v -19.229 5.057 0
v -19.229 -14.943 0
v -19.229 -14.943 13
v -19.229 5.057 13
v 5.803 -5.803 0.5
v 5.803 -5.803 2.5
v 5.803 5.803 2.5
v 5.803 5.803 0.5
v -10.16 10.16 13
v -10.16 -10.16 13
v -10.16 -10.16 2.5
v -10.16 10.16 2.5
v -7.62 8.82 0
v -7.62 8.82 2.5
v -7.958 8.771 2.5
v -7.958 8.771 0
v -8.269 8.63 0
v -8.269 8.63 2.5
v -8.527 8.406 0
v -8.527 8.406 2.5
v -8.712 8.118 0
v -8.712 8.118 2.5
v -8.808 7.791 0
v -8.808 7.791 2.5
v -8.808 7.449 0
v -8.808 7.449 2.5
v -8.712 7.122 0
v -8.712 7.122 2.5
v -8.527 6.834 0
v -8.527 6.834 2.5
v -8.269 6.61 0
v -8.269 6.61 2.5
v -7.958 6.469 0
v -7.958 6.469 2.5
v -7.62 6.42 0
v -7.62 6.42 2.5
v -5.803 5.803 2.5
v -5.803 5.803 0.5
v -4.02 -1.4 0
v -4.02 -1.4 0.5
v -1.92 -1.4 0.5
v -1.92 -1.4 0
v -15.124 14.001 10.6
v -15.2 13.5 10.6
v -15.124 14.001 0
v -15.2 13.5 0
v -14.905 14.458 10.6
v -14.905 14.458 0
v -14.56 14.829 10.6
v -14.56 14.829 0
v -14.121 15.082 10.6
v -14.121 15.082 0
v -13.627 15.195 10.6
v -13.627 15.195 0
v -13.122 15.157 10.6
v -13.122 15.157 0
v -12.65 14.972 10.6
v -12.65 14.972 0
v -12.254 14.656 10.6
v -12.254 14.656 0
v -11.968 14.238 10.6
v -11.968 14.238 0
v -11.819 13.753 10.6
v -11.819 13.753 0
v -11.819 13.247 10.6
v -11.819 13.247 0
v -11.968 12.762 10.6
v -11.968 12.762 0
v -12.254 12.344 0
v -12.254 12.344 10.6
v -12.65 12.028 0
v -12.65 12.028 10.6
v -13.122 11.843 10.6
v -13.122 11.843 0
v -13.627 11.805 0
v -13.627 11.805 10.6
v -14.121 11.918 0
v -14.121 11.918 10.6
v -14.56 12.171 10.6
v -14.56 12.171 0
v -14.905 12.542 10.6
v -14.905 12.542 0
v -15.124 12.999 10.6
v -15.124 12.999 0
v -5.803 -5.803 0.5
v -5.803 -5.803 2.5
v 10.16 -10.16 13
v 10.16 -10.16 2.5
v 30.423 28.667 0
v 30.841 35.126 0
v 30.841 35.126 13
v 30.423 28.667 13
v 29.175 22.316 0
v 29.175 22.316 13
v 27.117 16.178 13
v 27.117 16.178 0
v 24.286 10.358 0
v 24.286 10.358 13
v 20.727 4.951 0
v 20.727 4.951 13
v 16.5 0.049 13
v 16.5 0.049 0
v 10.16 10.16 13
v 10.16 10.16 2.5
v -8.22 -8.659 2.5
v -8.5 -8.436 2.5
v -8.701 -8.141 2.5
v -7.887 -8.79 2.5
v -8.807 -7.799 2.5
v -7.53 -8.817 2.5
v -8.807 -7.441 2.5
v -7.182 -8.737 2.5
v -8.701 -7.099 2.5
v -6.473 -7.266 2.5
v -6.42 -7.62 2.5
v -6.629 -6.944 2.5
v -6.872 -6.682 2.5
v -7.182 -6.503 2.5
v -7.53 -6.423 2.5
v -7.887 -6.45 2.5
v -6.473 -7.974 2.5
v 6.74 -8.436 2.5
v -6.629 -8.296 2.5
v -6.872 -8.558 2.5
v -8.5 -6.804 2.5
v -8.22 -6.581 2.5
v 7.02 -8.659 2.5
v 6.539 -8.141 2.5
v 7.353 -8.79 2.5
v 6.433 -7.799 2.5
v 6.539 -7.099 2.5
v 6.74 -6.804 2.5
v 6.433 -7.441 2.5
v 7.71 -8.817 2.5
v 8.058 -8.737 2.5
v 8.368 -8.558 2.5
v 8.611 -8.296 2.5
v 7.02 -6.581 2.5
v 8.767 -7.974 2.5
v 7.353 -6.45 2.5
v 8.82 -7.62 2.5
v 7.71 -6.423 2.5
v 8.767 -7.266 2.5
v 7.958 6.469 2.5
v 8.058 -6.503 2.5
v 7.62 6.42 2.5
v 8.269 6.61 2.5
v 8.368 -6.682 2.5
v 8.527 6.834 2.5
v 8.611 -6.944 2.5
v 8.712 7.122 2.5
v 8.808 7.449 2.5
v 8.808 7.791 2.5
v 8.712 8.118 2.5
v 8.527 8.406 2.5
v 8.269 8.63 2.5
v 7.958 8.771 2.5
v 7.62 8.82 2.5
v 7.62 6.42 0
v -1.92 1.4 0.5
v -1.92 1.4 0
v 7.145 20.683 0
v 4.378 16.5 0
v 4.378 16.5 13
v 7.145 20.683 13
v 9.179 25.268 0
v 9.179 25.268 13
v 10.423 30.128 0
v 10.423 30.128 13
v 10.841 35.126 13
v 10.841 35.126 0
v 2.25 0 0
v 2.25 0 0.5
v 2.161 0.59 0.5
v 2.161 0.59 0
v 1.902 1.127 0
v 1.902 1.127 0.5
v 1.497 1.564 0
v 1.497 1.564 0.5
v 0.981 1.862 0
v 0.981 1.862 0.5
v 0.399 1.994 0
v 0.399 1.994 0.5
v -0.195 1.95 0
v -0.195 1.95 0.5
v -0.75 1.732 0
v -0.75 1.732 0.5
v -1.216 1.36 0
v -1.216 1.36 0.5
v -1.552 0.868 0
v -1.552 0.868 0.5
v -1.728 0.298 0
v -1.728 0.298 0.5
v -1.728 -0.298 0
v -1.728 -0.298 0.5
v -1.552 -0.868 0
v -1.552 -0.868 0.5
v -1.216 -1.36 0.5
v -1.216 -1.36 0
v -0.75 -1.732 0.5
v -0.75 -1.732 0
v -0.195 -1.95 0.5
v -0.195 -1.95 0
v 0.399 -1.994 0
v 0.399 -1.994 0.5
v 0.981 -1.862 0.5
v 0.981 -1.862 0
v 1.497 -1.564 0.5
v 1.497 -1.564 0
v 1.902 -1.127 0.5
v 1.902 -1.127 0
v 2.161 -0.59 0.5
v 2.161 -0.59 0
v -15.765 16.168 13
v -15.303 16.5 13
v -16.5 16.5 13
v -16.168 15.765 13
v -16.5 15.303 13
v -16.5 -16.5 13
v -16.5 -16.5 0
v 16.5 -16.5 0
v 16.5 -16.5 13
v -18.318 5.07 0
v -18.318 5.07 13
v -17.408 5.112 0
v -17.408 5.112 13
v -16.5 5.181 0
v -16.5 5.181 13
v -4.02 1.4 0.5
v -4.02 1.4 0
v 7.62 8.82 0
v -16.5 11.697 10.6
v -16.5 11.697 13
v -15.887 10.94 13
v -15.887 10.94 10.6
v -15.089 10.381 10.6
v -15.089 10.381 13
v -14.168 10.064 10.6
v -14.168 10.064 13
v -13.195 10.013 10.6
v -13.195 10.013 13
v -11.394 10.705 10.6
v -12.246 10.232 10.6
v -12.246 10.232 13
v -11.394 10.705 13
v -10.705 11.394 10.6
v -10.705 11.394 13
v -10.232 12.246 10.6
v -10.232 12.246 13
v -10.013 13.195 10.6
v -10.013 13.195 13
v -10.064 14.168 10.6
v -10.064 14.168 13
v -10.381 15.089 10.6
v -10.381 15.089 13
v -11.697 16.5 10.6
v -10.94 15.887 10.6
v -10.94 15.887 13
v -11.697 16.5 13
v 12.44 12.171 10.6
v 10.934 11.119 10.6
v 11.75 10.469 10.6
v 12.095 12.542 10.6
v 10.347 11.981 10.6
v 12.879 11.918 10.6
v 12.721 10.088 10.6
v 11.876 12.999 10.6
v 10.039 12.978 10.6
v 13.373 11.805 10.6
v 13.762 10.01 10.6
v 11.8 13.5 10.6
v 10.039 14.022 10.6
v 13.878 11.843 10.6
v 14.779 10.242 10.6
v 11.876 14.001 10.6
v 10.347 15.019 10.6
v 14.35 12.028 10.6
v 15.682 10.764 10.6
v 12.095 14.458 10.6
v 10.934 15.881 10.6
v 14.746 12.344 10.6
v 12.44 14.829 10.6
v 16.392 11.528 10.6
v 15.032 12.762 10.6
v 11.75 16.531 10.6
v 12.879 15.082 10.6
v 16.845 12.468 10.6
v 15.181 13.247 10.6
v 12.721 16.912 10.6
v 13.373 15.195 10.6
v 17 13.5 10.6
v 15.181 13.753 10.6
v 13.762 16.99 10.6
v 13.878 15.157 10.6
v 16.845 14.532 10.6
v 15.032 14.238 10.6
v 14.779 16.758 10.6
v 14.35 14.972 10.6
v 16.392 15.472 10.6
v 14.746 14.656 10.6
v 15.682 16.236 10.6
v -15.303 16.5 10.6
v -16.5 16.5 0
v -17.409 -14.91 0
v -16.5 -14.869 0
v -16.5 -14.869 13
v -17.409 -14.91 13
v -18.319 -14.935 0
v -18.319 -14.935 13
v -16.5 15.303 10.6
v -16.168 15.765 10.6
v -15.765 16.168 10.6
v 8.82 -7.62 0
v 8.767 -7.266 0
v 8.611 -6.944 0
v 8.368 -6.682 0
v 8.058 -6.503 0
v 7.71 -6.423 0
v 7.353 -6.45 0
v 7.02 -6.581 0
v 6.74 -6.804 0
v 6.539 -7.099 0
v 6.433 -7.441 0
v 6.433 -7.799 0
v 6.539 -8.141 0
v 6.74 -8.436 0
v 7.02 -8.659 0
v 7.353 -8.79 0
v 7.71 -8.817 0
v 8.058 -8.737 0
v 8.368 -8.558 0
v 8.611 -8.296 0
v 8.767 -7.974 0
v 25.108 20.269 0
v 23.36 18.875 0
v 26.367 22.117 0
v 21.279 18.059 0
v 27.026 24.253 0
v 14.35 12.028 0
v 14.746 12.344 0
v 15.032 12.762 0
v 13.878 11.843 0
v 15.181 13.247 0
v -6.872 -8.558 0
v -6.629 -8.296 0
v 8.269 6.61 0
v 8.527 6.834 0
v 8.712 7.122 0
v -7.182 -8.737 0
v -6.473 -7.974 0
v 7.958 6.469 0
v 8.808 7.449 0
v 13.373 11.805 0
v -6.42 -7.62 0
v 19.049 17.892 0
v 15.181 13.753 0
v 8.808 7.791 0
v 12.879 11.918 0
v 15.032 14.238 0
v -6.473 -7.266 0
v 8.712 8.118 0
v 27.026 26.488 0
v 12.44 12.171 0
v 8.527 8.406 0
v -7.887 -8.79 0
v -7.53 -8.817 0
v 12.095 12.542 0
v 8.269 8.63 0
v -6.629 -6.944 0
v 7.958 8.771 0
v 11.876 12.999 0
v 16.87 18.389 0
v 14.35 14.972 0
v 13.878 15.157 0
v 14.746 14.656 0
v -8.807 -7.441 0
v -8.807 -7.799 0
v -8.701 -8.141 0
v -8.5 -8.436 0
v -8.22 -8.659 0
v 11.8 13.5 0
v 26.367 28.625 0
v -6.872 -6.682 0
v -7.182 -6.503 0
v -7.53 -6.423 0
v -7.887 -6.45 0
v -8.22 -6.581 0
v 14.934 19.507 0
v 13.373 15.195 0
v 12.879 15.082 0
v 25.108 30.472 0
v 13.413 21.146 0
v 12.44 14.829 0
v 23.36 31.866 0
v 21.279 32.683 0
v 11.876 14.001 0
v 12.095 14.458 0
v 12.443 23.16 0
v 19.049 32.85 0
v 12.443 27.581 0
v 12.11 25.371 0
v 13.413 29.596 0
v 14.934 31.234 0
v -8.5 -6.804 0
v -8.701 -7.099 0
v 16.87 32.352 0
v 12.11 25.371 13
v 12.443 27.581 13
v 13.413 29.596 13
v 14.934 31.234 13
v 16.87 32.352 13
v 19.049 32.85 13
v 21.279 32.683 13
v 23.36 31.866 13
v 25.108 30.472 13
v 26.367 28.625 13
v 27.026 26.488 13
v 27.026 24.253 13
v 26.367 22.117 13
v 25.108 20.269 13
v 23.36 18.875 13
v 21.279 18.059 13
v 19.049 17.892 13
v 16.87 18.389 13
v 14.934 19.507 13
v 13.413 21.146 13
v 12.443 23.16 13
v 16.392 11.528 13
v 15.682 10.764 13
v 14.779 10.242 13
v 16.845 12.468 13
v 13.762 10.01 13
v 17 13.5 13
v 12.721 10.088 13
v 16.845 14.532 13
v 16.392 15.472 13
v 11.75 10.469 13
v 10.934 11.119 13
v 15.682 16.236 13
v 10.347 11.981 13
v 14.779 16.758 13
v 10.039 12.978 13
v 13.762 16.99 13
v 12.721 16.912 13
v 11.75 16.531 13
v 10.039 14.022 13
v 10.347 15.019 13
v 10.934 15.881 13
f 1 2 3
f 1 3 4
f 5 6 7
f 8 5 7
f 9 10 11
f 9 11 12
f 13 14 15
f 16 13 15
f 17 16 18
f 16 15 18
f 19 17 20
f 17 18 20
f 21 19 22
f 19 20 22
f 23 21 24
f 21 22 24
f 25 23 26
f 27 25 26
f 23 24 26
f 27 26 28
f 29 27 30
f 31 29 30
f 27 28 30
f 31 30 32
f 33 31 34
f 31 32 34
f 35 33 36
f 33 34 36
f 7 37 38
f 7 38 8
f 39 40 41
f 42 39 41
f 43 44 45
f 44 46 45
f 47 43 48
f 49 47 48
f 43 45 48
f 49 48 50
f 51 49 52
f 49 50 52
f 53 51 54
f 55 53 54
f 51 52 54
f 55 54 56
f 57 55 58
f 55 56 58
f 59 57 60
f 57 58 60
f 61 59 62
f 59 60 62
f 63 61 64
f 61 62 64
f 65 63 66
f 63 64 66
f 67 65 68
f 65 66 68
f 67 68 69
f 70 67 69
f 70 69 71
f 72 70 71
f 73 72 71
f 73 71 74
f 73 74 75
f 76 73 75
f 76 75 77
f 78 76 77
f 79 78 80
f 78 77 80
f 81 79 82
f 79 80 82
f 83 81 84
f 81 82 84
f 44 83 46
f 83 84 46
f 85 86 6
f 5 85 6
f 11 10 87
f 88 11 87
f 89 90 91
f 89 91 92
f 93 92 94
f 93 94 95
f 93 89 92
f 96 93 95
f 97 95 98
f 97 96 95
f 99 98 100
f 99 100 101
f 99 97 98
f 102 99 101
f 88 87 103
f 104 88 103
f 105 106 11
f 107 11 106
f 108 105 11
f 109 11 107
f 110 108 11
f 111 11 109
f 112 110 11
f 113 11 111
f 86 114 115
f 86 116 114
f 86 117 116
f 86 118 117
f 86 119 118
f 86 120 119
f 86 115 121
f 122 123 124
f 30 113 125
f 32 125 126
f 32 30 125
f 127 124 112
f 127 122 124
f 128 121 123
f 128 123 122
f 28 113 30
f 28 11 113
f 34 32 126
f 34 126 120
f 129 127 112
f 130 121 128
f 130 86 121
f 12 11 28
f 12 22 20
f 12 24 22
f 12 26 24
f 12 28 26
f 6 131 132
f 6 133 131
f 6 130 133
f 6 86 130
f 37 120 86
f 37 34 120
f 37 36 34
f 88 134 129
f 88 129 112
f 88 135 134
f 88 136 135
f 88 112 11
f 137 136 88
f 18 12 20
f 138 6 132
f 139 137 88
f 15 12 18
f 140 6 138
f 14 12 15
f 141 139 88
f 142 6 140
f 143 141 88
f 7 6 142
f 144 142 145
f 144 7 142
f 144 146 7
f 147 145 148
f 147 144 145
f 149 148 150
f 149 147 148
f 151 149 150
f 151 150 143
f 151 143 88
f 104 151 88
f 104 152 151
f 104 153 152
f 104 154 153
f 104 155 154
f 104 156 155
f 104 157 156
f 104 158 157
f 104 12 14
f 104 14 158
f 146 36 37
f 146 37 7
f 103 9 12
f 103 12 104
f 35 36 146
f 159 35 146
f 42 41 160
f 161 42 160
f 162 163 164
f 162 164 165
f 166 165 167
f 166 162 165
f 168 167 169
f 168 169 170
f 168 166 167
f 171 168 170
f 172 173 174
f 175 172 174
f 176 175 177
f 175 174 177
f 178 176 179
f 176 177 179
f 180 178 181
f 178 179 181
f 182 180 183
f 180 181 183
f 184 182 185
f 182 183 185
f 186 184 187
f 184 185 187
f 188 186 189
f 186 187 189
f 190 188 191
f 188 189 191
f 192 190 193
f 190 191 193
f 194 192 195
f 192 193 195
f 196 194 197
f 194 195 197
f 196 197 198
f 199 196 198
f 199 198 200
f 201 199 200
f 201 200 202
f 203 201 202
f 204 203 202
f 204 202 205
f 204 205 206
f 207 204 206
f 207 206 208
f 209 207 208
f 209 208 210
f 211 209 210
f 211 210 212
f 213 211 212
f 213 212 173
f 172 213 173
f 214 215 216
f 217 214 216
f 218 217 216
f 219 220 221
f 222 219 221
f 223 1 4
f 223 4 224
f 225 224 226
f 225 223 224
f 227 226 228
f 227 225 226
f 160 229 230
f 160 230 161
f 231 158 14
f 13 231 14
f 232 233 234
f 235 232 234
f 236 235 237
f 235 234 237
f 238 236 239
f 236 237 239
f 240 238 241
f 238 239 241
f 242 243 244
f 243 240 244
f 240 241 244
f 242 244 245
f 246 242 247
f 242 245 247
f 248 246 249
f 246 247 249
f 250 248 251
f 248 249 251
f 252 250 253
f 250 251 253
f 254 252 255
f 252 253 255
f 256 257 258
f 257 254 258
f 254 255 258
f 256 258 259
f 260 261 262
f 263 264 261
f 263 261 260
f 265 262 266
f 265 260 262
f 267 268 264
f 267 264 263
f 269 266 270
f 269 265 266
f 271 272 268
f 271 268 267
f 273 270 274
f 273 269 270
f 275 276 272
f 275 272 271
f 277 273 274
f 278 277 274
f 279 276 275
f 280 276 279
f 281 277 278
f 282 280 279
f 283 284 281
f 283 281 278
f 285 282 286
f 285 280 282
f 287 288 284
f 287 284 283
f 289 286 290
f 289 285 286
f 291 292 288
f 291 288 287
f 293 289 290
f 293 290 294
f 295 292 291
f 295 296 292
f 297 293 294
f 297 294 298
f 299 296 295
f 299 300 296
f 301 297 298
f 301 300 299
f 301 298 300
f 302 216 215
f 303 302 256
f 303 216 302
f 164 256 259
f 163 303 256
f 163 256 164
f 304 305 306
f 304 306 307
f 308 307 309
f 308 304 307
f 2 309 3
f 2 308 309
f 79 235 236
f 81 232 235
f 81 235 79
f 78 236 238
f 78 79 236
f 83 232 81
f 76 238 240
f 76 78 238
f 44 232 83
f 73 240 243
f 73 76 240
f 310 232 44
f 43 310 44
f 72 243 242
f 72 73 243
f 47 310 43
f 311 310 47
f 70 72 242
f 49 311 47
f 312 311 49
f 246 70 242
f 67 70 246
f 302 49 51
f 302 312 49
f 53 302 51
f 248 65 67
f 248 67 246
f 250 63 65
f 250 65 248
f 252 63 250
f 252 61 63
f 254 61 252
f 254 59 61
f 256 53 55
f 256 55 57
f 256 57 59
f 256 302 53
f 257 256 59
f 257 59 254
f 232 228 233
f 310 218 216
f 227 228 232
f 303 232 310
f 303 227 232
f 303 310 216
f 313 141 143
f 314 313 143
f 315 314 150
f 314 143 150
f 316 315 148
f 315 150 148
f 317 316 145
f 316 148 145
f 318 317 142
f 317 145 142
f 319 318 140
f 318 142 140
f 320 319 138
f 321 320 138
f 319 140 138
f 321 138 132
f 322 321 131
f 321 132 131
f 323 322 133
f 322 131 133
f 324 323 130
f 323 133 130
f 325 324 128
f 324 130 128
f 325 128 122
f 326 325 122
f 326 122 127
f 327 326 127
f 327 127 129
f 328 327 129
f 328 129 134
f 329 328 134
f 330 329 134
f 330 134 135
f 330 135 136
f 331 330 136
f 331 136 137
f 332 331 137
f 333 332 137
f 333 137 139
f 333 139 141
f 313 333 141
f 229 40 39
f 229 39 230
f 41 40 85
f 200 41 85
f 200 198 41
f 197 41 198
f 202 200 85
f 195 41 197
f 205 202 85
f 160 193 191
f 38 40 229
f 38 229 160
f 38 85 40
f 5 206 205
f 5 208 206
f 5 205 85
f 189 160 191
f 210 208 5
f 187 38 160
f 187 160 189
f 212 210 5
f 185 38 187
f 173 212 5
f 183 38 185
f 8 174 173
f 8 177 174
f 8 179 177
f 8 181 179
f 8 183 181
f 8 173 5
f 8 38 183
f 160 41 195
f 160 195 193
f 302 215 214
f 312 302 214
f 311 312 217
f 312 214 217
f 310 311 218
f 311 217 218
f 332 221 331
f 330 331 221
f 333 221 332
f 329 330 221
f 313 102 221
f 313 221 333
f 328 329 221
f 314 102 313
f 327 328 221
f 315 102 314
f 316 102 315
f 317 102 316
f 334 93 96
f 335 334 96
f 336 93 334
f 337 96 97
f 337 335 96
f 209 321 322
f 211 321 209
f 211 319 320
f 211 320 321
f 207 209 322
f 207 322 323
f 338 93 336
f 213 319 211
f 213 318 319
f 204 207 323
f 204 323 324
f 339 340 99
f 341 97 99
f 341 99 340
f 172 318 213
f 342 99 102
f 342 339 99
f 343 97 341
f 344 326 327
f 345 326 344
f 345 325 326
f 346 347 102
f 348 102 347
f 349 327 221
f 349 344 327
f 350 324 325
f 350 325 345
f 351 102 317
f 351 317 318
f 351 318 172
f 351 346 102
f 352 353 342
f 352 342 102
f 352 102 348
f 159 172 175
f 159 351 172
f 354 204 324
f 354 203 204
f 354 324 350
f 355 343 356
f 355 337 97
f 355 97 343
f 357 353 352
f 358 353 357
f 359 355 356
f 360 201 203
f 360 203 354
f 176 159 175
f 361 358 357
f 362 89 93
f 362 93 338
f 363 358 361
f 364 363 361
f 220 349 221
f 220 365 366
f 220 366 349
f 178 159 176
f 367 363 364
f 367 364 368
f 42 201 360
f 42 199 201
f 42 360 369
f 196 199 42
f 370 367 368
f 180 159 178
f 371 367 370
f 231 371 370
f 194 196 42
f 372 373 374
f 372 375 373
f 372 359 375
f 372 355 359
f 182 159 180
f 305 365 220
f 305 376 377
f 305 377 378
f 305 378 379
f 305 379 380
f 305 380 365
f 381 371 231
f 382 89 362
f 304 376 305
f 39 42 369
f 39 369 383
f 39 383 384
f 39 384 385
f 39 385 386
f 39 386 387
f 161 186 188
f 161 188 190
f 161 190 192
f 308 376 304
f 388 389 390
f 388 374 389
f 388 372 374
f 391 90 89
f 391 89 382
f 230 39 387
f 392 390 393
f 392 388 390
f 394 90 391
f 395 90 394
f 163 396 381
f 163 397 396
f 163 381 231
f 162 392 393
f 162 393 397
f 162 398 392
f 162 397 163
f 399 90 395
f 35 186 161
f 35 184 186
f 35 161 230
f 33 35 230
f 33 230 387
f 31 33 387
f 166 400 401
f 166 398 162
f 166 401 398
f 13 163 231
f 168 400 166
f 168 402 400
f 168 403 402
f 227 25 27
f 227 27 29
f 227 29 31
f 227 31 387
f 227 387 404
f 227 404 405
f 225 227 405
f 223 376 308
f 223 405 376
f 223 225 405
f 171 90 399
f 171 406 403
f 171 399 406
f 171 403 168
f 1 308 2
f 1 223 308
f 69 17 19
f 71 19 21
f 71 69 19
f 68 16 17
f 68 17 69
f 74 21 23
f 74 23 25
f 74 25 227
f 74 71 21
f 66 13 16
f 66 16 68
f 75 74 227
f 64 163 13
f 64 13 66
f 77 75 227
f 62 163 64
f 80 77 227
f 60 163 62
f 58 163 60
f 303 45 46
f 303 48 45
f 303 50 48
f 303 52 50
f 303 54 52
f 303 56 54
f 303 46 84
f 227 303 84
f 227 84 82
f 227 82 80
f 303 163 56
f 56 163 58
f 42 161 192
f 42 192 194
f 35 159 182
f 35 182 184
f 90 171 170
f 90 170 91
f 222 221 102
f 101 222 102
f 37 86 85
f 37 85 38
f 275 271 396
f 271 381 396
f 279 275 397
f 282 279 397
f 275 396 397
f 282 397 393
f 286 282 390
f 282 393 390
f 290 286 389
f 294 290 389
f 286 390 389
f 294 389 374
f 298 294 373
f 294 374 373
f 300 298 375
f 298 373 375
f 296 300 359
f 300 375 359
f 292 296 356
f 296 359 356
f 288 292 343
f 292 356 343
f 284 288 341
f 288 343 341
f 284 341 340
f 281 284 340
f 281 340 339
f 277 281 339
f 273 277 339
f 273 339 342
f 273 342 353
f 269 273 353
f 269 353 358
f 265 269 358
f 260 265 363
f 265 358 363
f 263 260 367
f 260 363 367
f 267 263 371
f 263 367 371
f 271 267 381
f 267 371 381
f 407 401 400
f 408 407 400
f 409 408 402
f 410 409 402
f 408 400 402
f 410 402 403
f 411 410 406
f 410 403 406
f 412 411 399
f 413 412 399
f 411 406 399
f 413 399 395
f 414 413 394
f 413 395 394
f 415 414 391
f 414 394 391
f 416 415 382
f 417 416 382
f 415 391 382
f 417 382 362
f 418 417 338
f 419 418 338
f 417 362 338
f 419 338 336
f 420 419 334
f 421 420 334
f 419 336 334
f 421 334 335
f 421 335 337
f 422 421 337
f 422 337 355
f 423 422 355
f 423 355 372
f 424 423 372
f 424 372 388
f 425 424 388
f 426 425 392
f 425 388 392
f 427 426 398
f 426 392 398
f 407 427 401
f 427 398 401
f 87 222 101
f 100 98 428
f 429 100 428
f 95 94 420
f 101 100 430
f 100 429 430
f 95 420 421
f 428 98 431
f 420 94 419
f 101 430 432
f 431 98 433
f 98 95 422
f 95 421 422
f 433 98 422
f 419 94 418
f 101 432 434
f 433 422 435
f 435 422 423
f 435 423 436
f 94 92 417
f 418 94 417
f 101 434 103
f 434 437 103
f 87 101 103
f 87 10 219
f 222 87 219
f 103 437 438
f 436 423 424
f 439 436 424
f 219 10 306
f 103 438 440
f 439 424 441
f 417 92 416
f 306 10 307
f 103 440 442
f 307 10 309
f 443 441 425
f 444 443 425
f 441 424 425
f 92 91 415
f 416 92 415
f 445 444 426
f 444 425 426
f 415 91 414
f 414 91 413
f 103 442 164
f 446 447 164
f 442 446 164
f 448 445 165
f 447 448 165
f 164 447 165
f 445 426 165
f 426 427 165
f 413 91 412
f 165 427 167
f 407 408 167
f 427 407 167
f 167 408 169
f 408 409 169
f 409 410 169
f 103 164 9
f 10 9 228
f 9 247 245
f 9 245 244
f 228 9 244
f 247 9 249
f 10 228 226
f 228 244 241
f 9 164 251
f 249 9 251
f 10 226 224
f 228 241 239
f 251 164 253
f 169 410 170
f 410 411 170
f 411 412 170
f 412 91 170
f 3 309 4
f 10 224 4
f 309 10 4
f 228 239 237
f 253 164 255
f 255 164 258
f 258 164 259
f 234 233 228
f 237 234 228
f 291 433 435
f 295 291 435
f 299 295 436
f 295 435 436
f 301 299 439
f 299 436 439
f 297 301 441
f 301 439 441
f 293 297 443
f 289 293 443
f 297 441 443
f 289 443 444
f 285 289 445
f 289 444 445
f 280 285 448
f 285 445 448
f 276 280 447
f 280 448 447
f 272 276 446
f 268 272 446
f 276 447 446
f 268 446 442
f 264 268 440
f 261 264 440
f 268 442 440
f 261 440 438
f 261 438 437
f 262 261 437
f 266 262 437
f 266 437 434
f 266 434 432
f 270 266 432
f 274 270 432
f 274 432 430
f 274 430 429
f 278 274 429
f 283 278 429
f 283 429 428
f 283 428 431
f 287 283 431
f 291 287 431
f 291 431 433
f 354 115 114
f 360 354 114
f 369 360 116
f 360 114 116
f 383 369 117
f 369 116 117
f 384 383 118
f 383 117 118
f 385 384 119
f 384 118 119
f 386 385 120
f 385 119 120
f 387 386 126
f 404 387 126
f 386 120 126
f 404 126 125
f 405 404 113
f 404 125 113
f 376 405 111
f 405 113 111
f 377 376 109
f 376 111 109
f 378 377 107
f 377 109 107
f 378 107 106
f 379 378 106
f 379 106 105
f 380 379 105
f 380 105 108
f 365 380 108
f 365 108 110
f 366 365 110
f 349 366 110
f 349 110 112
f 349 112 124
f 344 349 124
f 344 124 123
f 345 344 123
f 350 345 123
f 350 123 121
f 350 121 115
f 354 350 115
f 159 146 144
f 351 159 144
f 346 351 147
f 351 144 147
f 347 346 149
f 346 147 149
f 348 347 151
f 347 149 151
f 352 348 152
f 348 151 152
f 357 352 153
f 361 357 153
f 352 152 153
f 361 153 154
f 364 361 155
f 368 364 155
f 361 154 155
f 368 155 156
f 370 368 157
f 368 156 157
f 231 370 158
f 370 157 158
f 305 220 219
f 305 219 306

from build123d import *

# Parameters (mm, degrees)
ESQUISSE1_W                                        = 33
ESQUISSE1_H                                        = 33
BOSS_EXTRU_1_DEPTH                                 = 13
ESQUISSE3_R                                        = 2
ESQUISSE3_W                                        = 2.1
ESQUISSE3_H                                        = 2.8
ENL_V_MAT_EXTRU_1_DEPTH                            = 14
ESQUISSE4_W                                        = 11.606208868
ESQUISSE4_H                                        = 11.606208868
ESQUISSE4_R                                        = 2
ENL_V_MAT_EXTRU_2_DEPTH                            = 12.5
ESQUISSE2_R                                        = 1.2
ENL_V_MAT_EXTRU_3_DEPTH                            = 14
ESQUISSE5_W                                        = 20.32
ESQUISSE5_H                                        = 20.32
ENL_V_MAT_EXTRU_5_DEPTH                            = 10.5
ESQUISSE8_R                                        = 7.5
BOSS_EXTRU_4_DEPTH                                 = 13
CHAMBRAGE_POUR_VIS_T_TE_RONDE_BOMB_E_M_D           = 3.4
CHAMBRAGE_POUR_VIS_T_TE_RONDE_BOMB_E_M_CBORE_D     = 7
CHAMBRAGE_POUR_VIS_T_TE_RONDE_BOMB_E_M_CBORE_DEPTH = 2.4


with BuildPart() as part:
    # Esquisse1 → Boss.-Extru.1 (new body)
    with BuildSketch(Plane.XY):
        Rectangle(ESQUISSE1_W, ESQUISSE1_H)
    extrude(amount=BOSS_EXTRU_1_DEPTH)

    # Esquisse3 → Enlèv. mat.-Extru.1 (cut, through all)
    with BuildSketch(Plane.XY.offset(13)):
        with Locations((0.25, 0)):
            Circle(ESQUISSE3_R)
        with Locations((-2.97, 0)):
            Rectangle(ESQUISSE3_W, ESQUISSE3_H)
    extrude(amount=-ENL_V_MAT_EXTRU_1_DEPTH, mode=Mode.SUBTRACT)

    # Esquisse4 → Enlèv. mat.-Extru.2 (cut)
    with BuildSketch(Plane.XY.offset(13)):
        Rectangle(ESQUISSE4_W, ESQUISSE4_H)
        with Locations((0.25, 0)):
            Circle(ESQUISSE4_R, mode=Mode.SUBTRACT)
    extrude(amount=-ENL_V_MAT_EXTRU_2_DEPTH, mode=Mode.SUBTRACT)

    # Esquisse2 → Enlèv. mat.-Extru.3 (cut, through all)
    with BuildSketch(Plane.XY.offset(13)):
        with BuildLine():
            Line((7.62, 8.82), (-7.62, 8.82))
            ThreePointArc((-7.62, 8.82), (-8.82, 7.62), (-7.62, 6.42))
            Line((-7.62, 6.42), (7.62, 6.42))
            ThreePointArc((7.62, 6.42), (8.82, 7.62), (7.62, 8.82))
        make_face()
        with Locations((7.62, -7.62)):
            Circle(ESQUISSE2_R)
        with Locations((-7.62, -7.62)):
            Circle(ESQUISSE2_R)
    extrude(amount=-ENL_V_MAT_EXTRU_3_DEPTH, mode=Mode.SUBTRACT)

    # Esquisse5 → Enlèv. mat.-Extru.5 (cut)
    with BuildSketch(Plane.XY.offset(13)):
        Rectangle(ESQUISSE5_W, ESQUISSE5_H)
    extrude(amount=-ENL_V_MAT_EXTRU_5_DEPTH, mode=Mode.SUBTRACT)

    # Esquisse8 → Boss.-Extru.4 (add)
    with BuildSketch(Plane(origin=(0, 0, 0), x_dir=(-1, 0, 0), z_dir=(0, 0, -1))):
        with BuildLine():
            Line((19.228652316, -14.943489853), (19.228652316, 5.056510147))
            ThreePointArc((19.228652316, 5.056510147), (17.862916767, 5.087541175), (16.5, 5.180570213))
            Line((16.5, 5.180570213), (16.5, -14.869082996))
            ThreePointArc((16.5, -14.869082996), (17.863819007, -14.924884682), (19.228652316, -14.943489853))
        make_face()
        with BuildLine():
            ThreePointArc((-4.37758657, 16.5), (-9.179371873, 25.268372883), (-10.841194523, 35.126356986))
            Line((-10.841194523, 35.126356986), (-30.841194523, 35.126356986))
            ThreePointArc((-30.841194523, 35.126356986), (-27.117424712, 16.178251365), (-16.5, 0.048543968))
            Line((-16.5, 0.048543968), (-16.5, 16.5))
            Line((-16.5, 16.5), (-4.37758657, 16.5))
        make_face()
        with Locations((-19.609840661, 25.370666938)):
            Circle(ESQUISSE8_R, mode=Mode.SUBTRACT)
    extrude(amount=-BOSS_EXTRU_4_DEPTH)

    # Chambrage pour vis à tête ronde bombée M31 (through all)
    with Locations(Plane(origin=(-13.5, 13.5, 13), x_dir=(1, 0, 0), z_dir=(0, 0, 1))):
        with Locations((0, 0), (27, 0)):
            CounterBoreHole(CHAMBRAGE_POUR_VIS_T_TE_RONDE_BOMB_E_M_D / 2, CHAMBRAGE_POUR_VIS_T_TE_RONDE_BOMB_E_M_CBORE_D / 2, CHAMBRAGE_POUR_VIS_T_TE_RONDE_BOMB_E_M_CBORE_DEPTH)


solid = part.part
